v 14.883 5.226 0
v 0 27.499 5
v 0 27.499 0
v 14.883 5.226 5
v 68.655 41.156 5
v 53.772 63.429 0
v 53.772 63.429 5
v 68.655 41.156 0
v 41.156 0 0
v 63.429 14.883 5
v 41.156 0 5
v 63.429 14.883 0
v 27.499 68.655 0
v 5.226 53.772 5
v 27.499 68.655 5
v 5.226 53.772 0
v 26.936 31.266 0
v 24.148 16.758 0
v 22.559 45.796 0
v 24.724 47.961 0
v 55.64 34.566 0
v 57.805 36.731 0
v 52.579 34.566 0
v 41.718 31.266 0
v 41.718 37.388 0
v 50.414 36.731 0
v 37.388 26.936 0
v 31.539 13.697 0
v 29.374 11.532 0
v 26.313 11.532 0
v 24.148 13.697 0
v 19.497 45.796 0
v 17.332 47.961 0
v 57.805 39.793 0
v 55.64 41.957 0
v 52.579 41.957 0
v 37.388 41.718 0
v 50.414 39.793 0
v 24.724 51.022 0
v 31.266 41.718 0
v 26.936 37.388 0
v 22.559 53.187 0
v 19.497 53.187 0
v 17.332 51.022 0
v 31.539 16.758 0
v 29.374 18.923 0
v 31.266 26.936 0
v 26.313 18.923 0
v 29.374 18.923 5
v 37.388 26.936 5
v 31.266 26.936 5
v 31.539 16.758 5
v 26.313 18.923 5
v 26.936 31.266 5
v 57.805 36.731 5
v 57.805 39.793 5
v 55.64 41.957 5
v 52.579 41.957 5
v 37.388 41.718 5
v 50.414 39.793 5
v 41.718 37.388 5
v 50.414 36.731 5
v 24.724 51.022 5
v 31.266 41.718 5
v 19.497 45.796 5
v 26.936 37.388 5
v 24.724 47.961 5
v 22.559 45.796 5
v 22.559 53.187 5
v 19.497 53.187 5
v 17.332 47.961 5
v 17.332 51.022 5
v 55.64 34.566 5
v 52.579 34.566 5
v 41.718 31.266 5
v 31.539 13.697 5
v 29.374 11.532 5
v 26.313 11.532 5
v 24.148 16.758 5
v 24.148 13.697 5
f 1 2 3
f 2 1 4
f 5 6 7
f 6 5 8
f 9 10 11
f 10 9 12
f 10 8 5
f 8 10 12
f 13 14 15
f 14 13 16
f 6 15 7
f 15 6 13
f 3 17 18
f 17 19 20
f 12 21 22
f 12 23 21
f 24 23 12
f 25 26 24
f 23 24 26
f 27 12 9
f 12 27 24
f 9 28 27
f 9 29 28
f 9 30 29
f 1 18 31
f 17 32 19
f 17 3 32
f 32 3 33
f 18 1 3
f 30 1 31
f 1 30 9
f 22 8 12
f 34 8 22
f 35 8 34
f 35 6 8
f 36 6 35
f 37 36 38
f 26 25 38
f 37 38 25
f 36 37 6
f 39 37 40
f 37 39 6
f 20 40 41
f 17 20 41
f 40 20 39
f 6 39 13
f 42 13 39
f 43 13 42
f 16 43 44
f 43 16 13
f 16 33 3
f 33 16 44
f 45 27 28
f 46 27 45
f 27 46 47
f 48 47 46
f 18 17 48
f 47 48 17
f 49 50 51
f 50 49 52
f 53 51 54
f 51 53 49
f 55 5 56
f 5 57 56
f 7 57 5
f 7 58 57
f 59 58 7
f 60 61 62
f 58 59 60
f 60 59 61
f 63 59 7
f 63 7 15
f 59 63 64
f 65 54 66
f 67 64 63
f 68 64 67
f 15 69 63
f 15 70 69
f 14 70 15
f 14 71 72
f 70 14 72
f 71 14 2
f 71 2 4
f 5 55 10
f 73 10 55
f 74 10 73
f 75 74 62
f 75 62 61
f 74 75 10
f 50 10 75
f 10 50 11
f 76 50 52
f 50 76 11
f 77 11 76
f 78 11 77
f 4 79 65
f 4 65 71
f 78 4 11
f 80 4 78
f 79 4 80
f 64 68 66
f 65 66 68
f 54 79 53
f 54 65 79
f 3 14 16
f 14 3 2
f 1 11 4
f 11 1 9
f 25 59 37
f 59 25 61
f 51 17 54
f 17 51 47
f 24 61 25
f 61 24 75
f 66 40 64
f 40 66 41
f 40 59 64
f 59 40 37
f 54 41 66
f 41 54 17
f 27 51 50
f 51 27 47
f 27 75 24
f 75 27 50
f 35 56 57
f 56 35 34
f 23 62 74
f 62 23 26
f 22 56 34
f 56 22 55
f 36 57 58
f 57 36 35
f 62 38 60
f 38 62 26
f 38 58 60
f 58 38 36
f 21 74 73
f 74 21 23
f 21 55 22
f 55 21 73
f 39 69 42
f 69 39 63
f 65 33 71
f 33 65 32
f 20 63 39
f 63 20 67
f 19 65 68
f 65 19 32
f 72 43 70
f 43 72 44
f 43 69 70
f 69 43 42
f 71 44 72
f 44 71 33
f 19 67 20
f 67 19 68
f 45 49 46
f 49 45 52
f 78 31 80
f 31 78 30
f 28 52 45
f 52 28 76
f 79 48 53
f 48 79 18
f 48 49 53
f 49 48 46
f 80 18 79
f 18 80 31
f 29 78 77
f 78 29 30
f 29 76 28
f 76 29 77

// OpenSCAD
$fn = 32;

// ----------------------------------------------------------------------
// Polygon plate: 8-gon R35, 3 bolt windows
// ----------------------------------------------------------------------

// --- parameters (mm) ---
sides = 8;                // number of polygon sides
plate_r = 35;             // circumscribed radius of the polygon
bore_r = 8;               // centre bore radius
bolts = 3;                // number of bolt windows
ring_r = 20.17;           // bolt-circle radius
bolt_r = 4;               // bolt window radius
plate_t = 5;              // plate thickness, Z (extrusion height)

plate_d = 2 * plate_r;  // circumscribed diameter
bore_d = 2 * bore_r;  // centre bore diameter
bolt_d = 2 * bolt_r;  // bolt window diameter
ring_d = 2 * ring_r;  // bolt-circle diameter

profile = [[68.655, 41.156], [53.772, 63.429], [27.499, 68.655], [5.226, 53.772], [0, 27.499], [14.883, 5.226], [41.156, 0], [63.429, 14.883]];  // primary outline, 8 points, counter clockwise
void_1 = [[41.718, 37.388], [37.388, 41.718], [31.266, 41.718], [26.936, 37.388], [26.936, 31.266], [31.266, 26.936], [37.388, 26.936], [41.718, 31.266]];  // centre bore, 8 points
void_2 = [[57.805, 39.793], [55.64, 41.957], [52.579, 41.957], [50.414, 39.793], [50.414, 36.731], [52.579, 34.566], [55.64, 34.566], [57.805, 36.731]];  // bolt window 1, 8 points
void_3 = [[24.724, 51.022], [22.559, 53.187], [19.497, 53.187], [17.332, 51.022], [17.332, 47.961], [19.497, 45.796], [22.559, 45.796], [24.724, 47.961]];  // bolt window 2, 8 points
void_4 = [[31.539, 16.758], [29.374, 18.923], [26.313, 18.923], [24.148, 16.758], [24.148, 13.697], [26.313, 11.532], [29.374, 11.532], [31.539, 13.697]];  // bolt window 3, 8 points

// --- the one profile operation ---
difference() {
  linear_extrude(height = plate_t) polygon(points = profile);
  translate([0, 0, -1])
    linear_extrude(height = plate_t + 2) polygon(points = void_1);
  translate([0, 0, -1])
    linear_extrude(height = plate_t + 2) polygon(points = void_2);
  translate([0, 0, -1])
    linear_extrude(height = plate_t + 2) polygon(points = void_3);
  translate([0, 0, -1])
    linear_extrude(height = plate_t + 2) polygon(points = void_4);
}
